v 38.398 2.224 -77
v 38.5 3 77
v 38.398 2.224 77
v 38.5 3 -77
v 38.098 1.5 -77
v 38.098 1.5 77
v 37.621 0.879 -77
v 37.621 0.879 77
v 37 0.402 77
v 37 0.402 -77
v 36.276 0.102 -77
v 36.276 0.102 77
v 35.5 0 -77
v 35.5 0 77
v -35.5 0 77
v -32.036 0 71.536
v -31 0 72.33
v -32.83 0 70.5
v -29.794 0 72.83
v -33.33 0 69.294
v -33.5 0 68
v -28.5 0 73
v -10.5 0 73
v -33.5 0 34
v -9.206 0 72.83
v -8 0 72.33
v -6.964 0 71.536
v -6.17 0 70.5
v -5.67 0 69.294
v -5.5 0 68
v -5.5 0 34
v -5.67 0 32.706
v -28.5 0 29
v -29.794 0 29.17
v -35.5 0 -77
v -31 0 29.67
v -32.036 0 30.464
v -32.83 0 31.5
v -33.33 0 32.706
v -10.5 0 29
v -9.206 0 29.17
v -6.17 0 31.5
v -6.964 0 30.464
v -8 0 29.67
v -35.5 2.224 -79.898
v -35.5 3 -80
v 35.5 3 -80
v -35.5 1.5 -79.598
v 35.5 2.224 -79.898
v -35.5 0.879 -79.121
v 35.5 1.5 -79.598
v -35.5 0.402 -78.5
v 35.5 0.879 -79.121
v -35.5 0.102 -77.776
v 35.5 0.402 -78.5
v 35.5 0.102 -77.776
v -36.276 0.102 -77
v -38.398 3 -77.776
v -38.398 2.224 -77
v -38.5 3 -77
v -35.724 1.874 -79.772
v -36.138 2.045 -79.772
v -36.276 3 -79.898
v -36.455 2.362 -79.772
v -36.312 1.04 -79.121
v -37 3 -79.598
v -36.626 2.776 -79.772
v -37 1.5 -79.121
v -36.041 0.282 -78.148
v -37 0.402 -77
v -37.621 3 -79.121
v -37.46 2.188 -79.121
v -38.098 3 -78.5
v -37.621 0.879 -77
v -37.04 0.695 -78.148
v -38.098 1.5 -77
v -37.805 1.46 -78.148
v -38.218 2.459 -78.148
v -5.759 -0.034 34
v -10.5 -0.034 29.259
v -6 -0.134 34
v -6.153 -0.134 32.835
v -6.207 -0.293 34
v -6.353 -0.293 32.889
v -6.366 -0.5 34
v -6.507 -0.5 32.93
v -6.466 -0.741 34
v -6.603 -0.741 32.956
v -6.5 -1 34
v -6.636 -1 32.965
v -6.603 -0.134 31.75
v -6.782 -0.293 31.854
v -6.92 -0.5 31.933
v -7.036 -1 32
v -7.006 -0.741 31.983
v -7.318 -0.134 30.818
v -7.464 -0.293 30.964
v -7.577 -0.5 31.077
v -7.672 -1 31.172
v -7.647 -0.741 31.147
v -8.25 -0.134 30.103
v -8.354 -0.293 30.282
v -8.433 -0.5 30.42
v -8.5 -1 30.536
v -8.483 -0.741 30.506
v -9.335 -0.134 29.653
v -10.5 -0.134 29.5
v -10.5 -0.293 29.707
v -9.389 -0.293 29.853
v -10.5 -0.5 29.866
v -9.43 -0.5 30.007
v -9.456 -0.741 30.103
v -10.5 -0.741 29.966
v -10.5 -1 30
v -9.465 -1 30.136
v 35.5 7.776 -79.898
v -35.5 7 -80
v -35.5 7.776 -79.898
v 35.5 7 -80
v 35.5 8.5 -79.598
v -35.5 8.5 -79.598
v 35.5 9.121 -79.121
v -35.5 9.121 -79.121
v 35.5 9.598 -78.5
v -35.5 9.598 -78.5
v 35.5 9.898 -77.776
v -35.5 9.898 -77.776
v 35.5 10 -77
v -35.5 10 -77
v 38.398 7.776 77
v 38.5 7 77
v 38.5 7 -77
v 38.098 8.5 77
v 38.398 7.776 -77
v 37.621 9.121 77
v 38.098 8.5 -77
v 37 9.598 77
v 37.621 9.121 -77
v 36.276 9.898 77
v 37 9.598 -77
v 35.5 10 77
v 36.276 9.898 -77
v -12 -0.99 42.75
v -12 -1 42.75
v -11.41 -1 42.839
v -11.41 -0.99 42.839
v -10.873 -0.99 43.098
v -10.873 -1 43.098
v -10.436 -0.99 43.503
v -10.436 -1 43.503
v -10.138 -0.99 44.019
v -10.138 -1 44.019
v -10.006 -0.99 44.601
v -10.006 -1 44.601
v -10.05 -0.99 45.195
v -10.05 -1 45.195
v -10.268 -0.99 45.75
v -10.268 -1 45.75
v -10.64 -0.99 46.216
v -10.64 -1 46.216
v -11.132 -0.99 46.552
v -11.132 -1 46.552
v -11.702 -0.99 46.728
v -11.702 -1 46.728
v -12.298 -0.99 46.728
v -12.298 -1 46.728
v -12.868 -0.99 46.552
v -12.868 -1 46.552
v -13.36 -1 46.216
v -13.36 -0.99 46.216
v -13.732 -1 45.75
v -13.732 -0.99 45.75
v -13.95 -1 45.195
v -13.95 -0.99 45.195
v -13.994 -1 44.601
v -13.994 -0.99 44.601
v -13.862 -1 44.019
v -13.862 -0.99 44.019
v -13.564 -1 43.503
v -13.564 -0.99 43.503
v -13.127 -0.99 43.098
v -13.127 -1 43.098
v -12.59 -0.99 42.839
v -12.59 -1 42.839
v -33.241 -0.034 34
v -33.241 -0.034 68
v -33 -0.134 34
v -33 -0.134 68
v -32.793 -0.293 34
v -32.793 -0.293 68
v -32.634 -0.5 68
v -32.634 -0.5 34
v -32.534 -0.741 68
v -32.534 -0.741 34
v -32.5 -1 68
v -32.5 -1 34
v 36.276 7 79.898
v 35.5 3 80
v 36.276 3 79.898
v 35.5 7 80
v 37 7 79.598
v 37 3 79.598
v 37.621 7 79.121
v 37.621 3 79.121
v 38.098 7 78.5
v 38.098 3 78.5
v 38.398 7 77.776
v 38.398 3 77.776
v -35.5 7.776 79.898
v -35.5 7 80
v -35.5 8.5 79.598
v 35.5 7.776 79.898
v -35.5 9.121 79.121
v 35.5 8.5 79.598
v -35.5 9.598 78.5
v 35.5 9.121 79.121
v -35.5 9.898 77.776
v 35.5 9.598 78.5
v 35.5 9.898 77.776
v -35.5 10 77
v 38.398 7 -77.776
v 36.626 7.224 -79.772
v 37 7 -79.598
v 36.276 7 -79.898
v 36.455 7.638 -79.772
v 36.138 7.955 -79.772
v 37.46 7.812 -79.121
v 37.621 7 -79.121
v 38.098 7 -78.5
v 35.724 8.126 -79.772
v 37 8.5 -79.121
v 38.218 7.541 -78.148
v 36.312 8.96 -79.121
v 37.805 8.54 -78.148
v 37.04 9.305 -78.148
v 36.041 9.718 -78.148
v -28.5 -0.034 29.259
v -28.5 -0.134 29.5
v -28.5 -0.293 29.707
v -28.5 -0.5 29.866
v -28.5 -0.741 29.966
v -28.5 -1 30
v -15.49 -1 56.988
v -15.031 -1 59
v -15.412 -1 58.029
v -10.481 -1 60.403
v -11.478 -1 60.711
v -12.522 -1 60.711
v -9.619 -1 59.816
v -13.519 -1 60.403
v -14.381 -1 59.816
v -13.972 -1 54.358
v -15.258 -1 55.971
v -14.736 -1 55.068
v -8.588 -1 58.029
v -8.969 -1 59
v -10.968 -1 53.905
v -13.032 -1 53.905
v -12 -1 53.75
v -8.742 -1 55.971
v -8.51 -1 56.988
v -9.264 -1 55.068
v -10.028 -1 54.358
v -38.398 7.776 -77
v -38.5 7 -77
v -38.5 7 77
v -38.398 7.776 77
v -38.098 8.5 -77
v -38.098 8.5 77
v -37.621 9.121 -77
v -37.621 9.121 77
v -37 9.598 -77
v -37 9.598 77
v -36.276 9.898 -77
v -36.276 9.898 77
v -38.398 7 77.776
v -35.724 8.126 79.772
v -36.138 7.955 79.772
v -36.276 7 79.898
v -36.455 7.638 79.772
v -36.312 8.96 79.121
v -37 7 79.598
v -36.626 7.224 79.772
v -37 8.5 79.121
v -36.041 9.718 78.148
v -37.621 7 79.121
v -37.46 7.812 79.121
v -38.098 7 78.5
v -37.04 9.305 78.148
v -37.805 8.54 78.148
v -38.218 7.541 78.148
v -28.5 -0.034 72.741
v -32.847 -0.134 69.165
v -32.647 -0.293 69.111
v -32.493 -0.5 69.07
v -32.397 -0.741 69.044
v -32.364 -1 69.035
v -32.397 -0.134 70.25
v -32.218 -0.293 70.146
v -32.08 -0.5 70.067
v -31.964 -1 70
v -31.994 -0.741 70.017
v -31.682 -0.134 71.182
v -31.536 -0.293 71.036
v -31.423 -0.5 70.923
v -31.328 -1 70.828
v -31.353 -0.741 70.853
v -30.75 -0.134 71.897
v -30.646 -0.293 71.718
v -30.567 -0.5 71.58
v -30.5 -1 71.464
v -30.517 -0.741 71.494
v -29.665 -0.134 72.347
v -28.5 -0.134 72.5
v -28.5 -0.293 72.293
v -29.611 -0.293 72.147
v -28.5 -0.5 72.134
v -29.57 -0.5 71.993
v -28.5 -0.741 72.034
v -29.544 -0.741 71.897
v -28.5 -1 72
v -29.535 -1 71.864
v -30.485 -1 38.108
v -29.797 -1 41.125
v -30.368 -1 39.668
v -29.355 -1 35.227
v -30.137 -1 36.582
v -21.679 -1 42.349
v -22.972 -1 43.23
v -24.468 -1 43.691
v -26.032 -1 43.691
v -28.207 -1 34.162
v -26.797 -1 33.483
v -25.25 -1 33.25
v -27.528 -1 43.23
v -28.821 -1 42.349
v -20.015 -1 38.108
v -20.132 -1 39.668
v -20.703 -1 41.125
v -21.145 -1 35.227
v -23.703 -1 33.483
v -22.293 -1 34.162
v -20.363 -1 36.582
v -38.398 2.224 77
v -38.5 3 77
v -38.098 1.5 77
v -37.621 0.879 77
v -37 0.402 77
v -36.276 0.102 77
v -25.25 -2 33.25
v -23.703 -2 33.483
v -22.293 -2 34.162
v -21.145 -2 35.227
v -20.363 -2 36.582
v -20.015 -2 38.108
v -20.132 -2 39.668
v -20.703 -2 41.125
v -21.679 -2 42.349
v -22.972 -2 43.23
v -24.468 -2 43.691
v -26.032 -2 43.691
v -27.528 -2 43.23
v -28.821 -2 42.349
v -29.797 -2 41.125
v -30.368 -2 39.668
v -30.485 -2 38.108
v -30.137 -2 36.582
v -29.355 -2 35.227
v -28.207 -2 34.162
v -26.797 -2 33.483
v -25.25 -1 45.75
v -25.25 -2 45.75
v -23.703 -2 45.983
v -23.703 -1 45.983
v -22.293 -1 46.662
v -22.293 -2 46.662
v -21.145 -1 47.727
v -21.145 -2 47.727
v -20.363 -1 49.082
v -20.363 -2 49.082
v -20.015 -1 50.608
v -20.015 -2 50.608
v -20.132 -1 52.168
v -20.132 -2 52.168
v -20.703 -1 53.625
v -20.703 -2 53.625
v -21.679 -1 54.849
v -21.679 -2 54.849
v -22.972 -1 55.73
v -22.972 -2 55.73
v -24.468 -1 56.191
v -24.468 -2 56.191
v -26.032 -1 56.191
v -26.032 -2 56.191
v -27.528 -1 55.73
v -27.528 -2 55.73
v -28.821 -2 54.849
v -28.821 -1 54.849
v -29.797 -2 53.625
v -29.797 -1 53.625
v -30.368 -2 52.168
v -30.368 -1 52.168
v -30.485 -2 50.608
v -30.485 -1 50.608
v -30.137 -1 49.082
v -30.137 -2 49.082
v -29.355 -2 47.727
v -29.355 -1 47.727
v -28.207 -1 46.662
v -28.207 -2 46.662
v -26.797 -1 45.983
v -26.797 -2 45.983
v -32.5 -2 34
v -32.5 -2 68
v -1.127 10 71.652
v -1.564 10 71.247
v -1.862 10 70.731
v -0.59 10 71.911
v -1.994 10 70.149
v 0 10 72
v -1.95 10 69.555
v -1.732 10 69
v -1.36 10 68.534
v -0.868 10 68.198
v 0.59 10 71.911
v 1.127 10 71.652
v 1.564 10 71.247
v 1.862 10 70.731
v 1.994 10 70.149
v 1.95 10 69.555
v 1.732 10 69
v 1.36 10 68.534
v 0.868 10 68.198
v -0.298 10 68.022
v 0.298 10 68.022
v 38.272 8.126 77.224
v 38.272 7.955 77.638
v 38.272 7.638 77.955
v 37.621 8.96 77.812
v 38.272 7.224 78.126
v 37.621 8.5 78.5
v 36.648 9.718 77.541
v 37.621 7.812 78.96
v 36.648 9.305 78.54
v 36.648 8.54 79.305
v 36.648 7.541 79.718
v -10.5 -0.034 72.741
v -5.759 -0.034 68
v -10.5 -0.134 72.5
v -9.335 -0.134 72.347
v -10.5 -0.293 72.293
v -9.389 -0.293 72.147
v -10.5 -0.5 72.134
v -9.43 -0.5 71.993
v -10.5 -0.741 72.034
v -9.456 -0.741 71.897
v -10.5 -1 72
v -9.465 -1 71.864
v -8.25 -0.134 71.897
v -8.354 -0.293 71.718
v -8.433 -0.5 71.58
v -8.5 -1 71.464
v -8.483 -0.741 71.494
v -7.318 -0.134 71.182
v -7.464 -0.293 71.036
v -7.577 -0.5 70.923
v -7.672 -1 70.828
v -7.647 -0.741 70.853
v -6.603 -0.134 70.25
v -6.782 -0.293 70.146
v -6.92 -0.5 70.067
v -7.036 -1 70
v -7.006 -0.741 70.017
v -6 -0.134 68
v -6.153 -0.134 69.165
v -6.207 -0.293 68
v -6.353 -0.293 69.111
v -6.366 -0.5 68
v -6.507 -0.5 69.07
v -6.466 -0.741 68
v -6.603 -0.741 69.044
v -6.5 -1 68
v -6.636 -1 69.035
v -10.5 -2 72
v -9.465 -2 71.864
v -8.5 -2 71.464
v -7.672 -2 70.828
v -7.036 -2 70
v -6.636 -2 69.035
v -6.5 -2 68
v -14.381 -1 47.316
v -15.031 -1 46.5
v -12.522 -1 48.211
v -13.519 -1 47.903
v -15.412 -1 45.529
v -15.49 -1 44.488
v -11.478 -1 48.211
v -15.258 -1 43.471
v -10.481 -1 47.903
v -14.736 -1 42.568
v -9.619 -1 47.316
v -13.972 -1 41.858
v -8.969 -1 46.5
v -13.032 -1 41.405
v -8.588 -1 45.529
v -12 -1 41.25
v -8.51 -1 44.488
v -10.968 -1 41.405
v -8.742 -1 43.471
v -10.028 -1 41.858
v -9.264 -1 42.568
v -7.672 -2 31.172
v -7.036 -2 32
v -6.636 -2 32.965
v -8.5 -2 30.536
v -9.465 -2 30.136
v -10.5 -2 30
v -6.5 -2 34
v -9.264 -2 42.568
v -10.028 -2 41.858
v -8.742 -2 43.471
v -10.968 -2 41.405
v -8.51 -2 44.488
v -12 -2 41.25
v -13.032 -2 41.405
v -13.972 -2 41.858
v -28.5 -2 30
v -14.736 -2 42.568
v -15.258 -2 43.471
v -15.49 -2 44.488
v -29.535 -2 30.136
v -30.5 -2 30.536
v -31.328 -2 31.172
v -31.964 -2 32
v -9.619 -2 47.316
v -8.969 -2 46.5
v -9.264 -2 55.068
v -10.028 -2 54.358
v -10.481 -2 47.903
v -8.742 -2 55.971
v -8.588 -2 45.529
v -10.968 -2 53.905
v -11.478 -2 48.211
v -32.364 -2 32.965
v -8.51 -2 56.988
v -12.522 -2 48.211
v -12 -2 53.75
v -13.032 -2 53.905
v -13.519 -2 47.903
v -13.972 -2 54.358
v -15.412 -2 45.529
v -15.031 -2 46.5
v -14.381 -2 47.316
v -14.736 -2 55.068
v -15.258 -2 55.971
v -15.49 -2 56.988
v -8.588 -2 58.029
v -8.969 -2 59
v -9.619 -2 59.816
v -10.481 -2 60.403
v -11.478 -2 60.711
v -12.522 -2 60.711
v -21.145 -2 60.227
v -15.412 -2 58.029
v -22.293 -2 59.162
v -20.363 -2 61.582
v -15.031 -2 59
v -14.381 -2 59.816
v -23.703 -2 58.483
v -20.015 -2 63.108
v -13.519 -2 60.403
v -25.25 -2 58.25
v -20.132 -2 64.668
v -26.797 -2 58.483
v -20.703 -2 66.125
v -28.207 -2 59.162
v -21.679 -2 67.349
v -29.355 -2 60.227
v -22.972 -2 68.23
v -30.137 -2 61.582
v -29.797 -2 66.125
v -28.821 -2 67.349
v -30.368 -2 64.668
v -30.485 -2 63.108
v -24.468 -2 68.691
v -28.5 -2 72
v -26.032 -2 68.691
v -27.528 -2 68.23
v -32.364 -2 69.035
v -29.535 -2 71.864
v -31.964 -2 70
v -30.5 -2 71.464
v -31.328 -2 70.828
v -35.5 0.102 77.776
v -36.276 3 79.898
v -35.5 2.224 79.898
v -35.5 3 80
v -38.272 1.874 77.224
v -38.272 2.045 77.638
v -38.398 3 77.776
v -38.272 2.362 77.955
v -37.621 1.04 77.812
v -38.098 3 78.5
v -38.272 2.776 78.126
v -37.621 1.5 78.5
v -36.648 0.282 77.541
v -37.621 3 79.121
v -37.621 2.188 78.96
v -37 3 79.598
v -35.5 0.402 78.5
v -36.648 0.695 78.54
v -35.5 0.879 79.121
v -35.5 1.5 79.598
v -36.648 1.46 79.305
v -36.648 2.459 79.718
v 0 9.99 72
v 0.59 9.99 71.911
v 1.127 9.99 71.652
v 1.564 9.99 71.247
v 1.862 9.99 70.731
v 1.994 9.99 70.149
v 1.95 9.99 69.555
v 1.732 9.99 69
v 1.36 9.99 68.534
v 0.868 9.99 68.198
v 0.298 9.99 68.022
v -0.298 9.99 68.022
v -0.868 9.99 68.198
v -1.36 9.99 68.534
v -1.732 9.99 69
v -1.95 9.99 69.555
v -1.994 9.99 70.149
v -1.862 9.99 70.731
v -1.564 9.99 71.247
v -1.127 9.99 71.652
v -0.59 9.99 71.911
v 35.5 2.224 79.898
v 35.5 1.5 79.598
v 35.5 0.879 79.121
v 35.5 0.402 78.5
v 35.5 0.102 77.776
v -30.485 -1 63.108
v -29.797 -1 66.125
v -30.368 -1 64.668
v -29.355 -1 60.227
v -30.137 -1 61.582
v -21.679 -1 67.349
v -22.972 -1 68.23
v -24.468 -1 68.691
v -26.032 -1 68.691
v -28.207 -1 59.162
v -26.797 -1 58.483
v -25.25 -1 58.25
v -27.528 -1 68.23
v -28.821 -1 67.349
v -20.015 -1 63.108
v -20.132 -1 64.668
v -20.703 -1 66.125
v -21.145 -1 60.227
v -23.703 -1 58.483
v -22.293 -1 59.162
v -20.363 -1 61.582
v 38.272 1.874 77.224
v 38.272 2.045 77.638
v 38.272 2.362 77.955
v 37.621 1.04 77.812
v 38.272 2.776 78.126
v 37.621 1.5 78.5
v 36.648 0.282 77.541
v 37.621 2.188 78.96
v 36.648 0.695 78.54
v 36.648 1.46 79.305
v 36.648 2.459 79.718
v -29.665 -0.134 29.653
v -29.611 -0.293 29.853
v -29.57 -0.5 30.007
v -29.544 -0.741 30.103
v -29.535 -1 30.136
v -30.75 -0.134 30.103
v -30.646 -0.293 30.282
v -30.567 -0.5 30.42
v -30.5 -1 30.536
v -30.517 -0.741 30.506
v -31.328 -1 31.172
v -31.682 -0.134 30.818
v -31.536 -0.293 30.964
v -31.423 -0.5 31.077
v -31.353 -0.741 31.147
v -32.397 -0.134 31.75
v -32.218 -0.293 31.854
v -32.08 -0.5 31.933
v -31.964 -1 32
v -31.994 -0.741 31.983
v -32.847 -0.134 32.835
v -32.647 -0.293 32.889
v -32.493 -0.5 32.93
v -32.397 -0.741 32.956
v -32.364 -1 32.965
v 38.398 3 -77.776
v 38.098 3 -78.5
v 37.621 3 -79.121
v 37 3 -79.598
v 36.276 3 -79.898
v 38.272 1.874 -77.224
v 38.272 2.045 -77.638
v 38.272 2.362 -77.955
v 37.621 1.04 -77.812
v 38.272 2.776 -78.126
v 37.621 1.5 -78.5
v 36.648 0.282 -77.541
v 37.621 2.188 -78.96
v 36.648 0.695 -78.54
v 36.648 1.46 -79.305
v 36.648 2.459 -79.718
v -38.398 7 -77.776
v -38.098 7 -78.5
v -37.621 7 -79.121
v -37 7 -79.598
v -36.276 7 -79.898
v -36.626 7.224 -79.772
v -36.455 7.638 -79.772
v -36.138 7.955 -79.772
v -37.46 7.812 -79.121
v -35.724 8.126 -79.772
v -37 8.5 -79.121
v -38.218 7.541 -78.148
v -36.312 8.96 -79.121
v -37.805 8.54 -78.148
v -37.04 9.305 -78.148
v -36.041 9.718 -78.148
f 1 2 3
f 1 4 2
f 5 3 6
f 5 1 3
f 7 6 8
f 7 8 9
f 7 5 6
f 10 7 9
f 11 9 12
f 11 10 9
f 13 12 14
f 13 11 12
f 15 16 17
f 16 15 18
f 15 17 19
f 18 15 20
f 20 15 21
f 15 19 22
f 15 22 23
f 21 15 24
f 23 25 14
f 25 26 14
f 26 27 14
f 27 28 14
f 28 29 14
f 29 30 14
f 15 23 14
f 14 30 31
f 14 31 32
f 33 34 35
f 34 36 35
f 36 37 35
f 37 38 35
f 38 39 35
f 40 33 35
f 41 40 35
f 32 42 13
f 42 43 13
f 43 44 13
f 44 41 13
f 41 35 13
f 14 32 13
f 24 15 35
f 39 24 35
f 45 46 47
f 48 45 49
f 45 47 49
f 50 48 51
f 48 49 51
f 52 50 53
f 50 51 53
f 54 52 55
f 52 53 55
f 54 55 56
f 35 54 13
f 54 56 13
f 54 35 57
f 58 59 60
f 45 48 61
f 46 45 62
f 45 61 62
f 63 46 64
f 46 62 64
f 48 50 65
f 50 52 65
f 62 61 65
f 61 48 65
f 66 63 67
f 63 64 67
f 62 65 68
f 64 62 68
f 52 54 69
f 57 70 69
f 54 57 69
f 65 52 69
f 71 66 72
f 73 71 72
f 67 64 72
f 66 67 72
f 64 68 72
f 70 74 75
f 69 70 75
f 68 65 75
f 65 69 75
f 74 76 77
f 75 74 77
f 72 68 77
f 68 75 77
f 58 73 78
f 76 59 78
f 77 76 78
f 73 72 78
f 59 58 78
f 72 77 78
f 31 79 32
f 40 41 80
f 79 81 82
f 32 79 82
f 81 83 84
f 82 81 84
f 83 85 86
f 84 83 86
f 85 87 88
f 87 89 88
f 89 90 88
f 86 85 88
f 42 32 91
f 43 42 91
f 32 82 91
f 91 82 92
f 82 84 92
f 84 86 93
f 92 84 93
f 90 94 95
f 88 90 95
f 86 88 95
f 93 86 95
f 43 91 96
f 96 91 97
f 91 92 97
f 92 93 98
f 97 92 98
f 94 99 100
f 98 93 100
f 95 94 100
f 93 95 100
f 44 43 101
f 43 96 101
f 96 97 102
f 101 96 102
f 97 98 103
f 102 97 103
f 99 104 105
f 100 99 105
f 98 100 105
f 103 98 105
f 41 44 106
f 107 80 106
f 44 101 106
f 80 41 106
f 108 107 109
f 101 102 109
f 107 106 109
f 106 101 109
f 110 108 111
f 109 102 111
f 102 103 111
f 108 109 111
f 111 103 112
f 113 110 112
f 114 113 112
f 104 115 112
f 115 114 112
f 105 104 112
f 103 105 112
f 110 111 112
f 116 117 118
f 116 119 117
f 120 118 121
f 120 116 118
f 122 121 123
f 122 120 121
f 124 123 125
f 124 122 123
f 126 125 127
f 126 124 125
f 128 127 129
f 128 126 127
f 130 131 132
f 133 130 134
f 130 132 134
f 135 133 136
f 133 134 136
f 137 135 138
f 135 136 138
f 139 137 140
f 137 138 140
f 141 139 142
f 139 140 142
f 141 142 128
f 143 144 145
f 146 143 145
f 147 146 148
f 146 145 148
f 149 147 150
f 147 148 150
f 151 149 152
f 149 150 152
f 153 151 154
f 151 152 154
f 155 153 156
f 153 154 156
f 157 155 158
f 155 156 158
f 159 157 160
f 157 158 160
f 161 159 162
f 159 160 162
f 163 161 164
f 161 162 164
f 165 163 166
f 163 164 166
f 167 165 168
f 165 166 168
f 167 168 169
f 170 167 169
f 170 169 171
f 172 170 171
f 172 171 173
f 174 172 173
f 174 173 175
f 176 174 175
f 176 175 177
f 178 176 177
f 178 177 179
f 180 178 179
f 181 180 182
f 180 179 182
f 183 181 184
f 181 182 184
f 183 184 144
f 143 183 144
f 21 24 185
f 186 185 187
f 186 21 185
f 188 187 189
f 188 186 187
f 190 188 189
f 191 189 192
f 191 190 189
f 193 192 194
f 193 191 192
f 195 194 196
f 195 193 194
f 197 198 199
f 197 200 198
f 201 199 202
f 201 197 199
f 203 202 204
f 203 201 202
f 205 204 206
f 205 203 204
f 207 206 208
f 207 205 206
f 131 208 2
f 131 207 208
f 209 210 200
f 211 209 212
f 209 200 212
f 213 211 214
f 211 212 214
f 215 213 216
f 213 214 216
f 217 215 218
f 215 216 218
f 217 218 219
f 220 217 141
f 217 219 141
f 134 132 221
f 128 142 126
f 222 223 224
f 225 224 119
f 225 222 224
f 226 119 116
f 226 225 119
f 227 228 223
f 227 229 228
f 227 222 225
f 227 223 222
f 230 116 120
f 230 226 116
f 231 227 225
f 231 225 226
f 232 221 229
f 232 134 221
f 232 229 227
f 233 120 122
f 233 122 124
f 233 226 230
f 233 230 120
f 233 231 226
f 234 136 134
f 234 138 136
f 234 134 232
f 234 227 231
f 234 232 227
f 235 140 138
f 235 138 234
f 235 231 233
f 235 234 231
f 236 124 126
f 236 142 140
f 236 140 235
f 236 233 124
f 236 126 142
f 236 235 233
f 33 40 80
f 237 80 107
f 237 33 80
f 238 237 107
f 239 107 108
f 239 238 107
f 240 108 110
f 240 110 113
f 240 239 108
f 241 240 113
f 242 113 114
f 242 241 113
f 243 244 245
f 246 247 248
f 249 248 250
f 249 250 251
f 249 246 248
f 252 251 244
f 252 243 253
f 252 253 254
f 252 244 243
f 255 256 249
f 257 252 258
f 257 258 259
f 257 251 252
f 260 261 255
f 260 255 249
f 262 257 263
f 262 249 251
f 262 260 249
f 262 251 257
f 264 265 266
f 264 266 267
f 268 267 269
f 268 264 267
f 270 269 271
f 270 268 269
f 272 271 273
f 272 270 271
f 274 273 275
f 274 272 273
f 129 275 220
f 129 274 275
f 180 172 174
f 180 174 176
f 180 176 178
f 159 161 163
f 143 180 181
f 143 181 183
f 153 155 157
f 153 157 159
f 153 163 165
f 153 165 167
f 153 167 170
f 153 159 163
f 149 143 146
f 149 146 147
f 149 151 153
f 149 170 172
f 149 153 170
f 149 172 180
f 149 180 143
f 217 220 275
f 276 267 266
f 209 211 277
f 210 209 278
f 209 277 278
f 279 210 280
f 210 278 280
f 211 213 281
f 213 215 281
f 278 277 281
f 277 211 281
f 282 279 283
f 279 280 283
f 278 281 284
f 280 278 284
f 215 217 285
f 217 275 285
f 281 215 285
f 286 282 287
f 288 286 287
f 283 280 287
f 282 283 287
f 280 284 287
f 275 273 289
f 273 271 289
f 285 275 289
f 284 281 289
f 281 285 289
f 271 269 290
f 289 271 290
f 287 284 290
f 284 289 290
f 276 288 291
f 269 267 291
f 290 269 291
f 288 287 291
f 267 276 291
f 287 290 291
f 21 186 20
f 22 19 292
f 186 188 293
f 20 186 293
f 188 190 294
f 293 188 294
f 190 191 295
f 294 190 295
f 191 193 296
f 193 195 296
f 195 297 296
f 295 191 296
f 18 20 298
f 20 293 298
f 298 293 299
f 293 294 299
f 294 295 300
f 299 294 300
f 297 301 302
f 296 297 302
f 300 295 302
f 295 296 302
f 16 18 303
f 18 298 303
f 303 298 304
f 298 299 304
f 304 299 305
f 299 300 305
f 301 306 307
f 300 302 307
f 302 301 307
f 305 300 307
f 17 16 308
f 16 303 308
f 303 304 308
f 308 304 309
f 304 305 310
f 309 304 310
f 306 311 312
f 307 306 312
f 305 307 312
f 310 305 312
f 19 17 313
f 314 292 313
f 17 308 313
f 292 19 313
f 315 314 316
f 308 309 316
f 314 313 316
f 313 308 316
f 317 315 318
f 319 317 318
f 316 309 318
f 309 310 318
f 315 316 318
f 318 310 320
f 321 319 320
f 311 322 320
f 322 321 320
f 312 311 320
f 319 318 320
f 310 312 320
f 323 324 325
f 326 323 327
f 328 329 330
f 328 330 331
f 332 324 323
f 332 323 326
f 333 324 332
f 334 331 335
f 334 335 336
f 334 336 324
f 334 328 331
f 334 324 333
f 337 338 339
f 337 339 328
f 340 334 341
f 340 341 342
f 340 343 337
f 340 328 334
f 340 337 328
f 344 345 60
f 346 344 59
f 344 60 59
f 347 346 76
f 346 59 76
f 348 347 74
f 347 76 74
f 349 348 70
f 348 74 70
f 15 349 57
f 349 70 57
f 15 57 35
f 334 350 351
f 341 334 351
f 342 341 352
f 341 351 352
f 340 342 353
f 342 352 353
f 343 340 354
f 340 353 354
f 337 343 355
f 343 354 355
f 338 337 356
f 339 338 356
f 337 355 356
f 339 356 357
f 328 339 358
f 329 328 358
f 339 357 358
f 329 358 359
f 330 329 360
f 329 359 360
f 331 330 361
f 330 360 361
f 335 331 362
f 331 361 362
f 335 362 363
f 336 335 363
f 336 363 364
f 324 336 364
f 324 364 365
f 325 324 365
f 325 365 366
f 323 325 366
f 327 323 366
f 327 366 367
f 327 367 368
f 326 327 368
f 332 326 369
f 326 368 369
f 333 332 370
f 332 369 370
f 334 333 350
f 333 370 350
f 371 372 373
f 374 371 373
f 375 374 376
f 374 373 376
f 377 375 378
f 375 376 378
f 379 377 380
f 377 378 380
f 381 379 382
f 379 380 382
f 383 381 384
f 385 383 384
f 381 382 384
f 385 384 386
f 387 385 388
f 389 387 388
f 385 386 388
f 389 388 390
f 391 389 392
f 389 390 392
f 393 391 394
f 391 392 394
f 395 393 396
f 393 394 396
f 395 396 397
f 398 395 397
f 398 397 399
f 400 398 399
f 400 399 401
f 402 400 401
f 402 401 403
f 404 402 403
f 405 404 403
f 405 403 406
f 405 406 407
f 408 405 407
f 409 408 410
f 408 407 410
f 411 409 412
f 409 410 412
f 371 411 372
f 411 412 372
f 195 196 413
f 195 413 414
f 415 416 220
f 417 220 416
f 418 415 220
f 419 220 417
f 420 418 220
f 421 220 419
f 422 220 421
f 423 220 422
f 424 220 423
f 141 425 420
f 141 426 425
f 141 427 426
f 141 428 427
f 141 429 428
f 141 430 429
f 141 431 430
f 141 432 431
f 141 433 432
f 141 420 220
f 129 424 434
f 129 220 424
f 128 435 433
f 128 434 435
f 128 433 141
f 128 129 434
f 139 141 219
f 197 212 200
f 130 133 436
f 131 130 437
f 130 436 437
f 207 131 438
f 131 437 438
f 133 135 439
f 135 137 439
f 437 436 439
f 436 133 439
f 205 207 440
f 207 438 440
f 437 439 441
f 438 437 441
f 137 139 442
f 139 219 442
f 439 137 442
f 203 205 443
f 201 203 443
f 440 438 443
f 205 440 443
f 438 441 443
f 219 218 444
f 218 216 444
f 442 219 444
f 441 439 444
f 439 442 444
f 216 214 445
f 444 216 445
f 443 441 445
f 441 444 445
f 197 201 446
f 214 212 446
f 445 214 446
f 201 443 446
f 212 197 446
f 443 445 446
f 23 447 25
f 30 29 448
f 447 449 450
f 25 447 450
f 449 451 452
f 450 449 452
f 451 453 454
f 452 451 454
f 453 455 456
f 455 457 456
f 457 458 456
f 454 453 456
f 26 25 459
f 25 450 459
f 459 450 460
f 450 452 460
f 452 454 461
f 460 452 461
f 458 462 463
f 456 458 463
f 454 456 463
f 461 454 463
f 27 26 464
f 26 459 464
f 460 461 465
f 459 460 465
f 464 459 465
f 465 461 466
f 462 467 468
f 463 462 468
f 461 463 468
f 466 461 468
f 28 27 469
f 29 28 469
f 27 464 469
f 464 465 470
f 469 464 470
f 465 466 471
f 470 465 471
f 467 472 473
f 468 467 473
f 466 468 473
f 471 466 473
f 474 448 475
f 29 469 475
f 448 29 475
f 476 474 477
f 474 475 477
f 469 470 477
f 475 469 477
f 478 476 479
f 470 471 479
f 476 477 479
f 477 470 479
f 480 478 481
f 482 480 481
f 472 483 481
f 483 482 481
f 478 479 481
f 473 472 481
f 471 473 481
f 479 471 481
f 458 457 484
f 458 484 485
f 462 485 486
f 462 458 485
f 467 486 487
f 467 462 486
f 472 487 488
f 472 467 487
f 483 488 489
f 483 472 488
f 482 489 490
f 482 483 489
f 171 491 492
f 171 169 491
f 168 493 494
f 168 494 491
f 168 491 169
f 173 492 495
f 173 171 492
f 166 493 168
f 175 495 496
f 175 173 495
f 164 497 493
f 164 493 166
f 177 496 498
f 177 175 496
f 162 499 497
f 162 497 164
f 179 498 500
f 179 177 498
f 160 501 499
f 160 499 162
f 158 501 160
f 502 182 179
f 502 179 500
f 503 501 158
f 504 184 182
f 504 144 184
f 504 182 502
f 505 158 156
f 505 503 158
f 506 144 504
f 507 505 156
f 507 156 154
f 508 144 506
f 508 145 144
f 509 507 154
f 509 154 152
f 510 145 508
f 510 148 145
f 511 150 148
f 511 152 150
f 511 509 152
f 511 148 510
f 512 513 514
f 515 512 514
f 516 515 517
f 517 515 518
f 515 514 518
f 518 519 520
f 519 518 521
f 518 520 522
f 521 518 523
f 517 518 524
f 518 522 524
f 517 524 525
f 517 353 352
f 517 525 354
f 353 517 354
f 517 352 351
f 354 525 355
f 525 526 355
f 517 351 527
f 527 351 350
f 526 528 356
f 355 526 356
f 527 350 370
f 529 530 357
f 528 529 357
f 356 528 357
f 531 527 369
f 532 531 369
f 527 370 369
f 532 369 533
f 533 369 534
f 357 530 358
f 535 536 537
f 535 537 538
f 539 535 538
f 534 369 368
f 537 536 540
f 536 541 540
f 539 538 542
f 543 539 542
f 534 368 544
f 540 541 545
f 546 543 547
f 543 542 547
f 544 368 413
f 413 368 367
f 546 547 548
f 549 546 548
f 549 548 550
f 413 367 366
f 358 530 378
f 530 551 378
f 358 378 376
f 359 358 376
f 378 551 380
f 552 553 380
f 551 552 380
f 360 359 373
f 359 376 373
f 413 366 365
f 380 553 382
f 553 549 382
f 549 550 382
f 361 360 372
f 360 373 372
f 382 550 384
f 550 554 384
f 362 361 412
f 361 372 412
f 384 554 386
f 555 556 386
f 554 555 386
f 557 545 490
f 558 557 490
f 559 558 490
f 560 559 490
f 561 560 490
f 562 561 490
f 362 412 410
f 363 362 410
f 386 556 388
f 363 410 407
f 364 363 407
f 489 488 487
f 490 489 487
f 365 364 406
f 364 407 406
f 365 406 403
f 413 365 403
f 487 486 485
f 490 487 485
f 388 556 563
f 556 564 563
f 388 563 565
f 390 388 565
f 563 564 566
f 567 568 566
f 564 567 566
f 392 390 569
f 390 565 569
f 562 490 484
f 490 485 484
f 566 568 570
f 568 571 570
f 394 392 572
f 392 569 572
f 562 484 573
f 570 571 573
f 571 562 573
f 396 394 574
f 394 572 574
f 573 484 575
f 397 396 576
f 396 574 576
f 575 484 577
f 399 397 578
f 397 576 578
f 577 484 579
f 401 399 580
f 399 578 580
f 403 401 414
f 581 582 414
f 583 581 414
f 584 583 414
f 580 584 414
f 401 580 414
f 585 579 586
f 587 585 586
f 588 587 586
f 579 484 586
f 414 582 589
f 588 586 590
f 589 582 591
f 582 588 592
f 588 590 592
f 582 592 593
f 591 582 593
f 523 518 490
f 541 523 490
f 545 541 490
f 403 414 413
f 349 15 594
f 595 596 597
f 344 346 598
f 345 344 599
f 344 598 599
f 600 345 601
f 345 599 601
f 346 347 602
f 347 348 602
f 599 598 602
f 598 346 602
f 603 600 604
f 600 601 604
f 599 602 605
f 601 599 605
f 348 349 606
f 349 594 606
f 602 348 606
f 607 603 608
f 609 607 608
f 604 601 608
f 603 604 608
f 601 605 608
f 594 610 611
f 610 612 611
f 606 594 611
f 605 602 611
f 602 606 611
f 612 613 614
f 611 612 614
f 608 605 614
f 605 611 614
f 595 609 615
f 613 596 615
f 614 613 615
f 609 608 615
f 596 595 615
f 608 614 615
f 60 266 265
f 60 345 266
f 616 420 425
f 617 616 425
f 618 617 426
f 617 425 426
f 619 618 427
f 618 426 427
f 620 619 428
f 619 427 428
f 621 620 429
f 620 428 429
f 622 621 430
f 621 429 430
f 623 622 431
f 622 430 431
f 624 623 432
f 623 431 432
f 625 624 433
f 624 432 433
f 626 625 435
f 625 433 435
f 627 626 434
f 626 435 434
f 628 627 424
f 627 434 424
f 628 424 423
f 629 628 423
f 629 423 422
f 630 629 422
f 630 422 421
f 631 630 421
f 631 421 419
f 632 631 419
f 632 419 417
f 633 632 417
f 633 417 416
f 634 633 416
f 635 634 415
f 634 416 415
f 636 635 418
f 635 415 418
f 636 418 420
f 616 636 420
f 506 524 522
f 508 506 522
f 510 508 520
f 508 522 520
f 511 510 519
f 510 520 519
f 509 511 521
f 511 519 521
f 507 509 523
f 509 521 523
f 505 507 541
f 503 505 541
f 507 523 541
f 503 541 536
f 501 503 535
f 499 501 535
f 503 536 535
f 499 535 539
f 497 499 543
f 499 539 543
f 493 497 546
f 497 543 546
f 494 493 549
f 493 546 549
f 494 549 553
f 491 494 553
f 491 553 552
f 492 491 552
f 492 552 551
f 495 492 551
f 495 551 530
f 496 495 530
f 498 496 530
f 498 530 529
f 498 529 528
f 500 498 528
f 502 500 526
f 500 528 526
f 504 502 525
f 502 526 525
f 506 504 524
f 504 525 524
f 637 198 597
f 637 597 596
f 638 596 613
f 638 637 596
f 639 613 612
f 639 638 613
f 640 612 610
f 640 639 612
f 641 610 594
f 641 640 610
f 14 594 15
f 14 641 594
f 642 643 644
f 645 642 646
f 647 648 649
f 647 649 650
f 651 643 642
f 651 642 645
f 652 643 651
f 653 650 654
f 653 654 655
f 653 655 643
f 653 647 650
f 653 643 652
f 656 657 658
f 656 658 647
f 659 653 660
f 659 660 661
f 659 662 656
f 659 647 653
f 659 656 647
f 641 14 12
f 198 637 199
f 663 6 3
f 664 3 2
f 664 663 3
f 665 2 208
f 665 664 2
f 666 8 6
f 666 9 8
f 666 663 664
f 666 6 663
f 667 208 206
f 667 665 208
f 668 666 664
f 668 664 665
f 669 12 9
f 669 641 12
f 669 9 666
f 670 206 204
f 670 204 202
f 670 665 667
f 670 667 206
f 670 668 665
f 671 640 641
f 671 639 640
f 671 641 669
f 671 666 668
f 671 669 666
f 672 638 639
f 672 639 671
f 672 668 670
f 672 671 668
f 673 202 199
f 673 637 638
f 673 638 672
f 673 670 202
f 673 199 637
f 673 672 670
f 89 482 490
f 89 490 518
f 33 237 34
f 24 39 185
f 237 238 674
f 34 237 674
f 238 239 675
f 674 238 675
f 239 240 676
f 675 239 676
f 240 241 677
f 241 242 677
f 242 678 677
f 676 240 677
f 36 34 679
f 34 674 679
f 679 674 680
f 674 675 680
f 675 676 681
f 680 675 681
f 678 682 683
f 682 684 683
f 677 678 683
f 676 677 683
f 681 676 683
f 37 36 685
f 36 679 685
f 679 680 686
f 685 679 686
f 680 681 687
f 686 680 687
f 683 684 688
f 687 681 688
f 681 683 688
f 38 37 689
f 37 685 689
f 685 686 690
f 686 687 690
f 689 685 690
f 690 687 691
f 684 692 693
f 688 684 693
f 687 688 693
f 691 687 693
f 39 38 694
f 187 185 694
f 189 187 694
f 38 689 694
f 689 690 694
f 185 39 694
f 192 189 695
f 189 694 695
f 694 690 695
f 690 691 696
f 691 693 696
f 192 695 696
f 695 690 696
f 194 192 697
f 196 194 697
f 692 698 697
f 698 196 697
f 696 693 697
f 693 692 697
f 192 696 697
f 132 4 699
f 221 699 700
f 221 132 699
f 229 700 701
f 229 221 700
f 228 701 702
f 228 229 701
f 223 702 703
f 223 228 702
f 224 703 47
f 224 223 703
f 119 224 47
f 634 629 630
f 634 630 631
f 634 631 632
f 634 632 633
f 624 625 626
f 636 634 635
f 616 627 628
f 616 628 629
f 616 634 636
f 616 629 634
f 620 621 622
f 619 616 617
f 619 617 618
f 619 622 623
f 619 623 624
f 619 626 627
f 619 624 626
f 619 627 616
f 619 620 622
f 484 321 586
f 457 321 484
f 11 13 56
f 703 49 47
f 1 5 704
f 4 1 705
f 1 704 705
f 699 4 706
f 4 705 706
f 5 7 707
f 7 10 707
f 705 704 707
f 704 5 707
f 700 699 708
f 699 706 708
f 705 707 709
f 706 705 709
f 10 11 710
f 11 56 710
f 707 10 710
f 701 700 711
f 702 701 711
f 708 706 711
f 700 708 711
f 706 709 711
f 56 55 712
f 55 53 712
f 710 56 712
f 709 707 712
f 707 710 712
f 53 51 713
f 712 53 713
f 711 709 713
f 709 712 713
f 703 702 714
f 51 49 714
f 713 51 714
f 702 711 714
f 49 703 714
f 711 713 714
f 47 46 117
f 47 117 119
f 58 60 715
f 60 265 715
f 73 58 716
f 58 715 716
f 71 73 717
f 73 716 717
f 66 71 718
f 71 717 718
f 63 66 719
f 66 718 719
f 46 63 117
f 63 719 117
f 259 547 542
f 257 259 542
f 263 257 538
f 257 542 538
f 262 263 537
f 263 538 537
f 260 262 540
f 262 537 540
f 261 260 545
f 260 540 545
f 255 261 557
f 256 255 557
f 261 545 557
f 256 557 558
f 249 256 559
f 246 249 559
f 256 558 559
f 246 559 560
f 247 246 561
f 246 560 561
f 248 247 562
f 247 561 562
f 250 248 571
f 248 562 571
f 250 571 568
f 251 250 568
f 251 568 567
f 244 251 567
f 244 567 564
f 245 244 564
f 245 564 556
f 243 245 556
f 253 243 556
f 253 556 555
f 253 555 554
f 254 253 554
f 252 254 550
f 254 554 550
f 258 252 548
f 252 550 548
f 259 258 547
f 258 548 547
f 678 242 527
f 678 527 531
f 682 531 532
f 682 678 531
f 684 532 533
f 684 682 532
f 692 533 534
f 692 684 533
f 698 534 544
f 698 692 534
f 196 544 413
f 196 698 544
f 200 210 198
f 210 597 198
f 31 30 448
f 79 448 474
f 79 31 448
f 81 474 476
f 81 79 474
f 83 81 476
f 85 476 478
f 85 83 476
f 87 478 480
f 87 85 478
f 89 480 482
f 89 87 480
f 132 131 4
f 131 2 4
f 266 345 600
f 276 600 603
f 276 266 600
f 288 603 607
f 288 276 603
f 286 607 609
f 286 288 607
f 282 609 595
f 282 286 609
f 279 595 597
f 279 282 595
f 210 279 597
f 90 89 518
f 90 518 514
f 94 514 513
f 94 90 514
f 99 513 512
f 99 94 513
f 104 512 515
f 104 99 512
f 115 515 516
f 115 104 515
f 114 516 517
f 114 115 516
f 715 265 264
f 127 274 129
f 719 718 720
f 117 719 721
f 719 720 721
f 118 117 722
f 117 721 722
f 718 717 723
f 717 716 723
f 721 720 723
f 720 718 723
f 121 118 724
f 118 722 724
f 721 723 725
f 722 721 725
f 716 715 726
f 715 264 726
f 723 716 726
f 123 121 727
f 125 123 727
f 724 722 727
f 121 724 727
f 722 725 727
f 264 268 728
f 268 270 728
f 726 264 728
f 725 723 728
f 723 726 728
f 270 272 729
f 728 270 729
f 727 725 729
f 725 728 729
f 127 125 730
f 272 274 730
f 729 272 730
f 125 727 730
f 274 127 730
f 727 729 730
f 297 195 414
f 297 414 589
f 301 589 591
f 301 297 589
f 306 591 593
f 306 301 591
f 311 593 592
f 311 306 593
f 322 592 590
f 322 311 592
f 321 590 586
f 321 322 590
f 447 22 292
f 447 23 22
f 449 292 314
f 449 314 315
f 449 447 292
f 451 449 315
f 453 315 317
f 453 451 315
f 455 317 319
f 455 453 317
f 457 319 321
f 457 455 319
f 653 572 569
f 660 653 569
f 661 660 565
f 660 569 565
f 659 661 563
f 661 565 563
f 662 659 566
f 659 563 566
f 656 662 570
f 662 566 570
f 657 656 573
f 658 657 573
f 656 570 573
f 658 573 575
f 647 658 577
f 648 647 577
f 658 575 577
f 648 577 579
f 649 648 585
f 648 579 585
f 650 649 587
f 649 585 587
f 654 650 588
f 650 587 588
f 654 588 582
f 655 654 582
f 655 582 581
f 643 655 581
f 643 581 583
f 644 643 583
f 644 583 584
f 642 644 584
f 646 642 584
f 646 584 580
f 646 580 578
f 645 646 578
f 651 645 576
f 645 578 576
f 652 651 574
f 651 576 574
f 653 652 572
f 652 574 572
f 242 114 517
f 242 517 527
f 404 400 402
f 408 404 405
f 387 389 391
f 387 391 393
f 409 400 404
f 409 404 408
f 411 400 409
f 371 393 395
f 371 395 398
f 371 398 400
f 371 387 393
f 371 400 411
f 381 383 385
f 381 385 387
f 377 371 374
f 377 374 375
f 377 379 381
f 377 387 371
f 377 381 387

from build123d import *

# Parameters (mm, degrees)
SKETCH1_W           = 77
SKETCH1_H           = 160
BOSS_EXTRUDE1_DEPTH = 10
FILLET1_R           = 3
SKETCH2_R           = 2
CUT_EXTRUDE1_DEPTH  = 0.01
BOSS_EXTRUDE2_DEPTH = 2
FILLET2_R           = 1
SKETCH4_R           = 5.25
SKETCH4_R_2         = 3.5
CUT_EXTRUDE2_DEPTH  = 1
SKETCH5_R           = 2
CUT_EXTRUDE3_DEPTH  = 0.01


with BuildPart() as part:
    # Sketch1 → Boss-Extrude1 (new body)
    with BuildSketch(Plane(origin=(0, 0, 0), x_dir=(1, 0, 0), z_dir=(0, 1, 0))):
        Rectangle(SKETCH1_W, SKETCH1_H)
    extrude(amount=BOSS_EXTRUDE1_DEPTH)

    # Fillet1
    fillet1_edges = [part.edges().sort_by_distance(p)[0] for p in [
        (-38.5, 10, 0),
        (0, 10, 80),
        (38.5, 10, 0),
        (0, 0, 80),
        (-38.5, 0, 0),
        (0, 0, -80),
        (38.5, 0, 0),
        (38.5, 5, 80),
        (-38.5, 5, 80),
        (-38.5, 5, -80),
        (38.5, 5, -80),
        (0, 10, -80),
    ]]
    fillet(fillet1_edges, radius=FILLET1_R)

    # Sketch2 → Cut-Extrude1 (cut)
    with BuildSketch(Plane(origin=(0, 10, 0), x_dir=(1, 0, 0), z_dir=(0, 1, 0))):
        with Locations(Location((0, -70, 0), (0, 0, 270))):
            Circle(SKETCH2_R)
    extrude(amount=-CUT_EXTRUDE1_DEPTH, mode=Mode.SUBTRACT)

    # Sketch3 → Boss-Extrude2 (add)
    with BuildSketch(Plane.XZ):
        with BuildLine():
            Line((-28.5, 72), (-10.5, 72))
            ThreePointArc((-10.5, 72), (-7.671572875, 70.828427125), (-6.5, 68))
            Line((-6.5, 68), (-6.5, 34))
            ThreePointArc((-6.5, 34), (-7.671572875, 31.171572875), (-10.5, 30))
            Line((-10.5, 30), (-28.5, 30))
            ThreePointArc((-28.5, 30), (-31.328427125, 31.171572875), (-32.5, 34))
            Line((-32.5, 34), (-32.5, 68))
            ThreePointArc((-32.5, 68), (-31.328427125, 70.828427125), (-28.5, 72))
        make_face()
    extrude(amount=BOSS_EXTRUDE2_DEPTH)

    # Fillet2
    fillet2_edges = [part.edges().sort_by_distance(p)[0] for p in [
        (-31.328427125, 0, 31.171572875),
        (-19.5, 0, 30),
        (-7.671572875, 0, 31.171572875),
        (-6.5, 0, 51),
        (-7.671572875, 0, 70.828427125),
        (-19.5, 0, 72),
        (-31.328427125, 0, 70.828427125),
        (-32.5, 0, 51),
    ]]
    fillet(fillet2_edges, radius=FILLET2_R)

    # Sketch4 → Cut-Extrude2 (cut)
    with BuildSketch(Plane.XZ.offset(2)):
        with Locations(Location((-25.25, 63.5, 0), (0, 0, 270))):
            Circle(SKETCH4_R)
        with Locations(Location((-25.25, 51, 0), (0, 0, 270))):
            Circle(SKETCH4_R)
        with Locations(Location((-25.25, 38.5, 0), (0, 0, 270))):
            Circle(SKETCH4_R)
        with Locations(Location((-12, 57.25, 0), (0, 0, 270))):
            Circle(SKETCH4_R_2)
        with Locations(Location((-12, 44.75, 0), (0, 0, 270))):
            Circle(SKETCH4_R_2)
    extrude(amount=-CUT_EXTRUDE2_DEPTH, mode=Mode.SUBTRACT)

    # Sketch5 → Cut-Extrude3 (cut)
    with BuildSketch(Plane.XZ.offset(1)):
        with Locations(Location((-12, 44.75, 0), (0, 0, 270))):
            Circle(SKETCH5_R)
    extrude(amount=-CUT_EXTRUDE3_DEPTH, mode=Mode.SUBTRACT)


solid = part.part
